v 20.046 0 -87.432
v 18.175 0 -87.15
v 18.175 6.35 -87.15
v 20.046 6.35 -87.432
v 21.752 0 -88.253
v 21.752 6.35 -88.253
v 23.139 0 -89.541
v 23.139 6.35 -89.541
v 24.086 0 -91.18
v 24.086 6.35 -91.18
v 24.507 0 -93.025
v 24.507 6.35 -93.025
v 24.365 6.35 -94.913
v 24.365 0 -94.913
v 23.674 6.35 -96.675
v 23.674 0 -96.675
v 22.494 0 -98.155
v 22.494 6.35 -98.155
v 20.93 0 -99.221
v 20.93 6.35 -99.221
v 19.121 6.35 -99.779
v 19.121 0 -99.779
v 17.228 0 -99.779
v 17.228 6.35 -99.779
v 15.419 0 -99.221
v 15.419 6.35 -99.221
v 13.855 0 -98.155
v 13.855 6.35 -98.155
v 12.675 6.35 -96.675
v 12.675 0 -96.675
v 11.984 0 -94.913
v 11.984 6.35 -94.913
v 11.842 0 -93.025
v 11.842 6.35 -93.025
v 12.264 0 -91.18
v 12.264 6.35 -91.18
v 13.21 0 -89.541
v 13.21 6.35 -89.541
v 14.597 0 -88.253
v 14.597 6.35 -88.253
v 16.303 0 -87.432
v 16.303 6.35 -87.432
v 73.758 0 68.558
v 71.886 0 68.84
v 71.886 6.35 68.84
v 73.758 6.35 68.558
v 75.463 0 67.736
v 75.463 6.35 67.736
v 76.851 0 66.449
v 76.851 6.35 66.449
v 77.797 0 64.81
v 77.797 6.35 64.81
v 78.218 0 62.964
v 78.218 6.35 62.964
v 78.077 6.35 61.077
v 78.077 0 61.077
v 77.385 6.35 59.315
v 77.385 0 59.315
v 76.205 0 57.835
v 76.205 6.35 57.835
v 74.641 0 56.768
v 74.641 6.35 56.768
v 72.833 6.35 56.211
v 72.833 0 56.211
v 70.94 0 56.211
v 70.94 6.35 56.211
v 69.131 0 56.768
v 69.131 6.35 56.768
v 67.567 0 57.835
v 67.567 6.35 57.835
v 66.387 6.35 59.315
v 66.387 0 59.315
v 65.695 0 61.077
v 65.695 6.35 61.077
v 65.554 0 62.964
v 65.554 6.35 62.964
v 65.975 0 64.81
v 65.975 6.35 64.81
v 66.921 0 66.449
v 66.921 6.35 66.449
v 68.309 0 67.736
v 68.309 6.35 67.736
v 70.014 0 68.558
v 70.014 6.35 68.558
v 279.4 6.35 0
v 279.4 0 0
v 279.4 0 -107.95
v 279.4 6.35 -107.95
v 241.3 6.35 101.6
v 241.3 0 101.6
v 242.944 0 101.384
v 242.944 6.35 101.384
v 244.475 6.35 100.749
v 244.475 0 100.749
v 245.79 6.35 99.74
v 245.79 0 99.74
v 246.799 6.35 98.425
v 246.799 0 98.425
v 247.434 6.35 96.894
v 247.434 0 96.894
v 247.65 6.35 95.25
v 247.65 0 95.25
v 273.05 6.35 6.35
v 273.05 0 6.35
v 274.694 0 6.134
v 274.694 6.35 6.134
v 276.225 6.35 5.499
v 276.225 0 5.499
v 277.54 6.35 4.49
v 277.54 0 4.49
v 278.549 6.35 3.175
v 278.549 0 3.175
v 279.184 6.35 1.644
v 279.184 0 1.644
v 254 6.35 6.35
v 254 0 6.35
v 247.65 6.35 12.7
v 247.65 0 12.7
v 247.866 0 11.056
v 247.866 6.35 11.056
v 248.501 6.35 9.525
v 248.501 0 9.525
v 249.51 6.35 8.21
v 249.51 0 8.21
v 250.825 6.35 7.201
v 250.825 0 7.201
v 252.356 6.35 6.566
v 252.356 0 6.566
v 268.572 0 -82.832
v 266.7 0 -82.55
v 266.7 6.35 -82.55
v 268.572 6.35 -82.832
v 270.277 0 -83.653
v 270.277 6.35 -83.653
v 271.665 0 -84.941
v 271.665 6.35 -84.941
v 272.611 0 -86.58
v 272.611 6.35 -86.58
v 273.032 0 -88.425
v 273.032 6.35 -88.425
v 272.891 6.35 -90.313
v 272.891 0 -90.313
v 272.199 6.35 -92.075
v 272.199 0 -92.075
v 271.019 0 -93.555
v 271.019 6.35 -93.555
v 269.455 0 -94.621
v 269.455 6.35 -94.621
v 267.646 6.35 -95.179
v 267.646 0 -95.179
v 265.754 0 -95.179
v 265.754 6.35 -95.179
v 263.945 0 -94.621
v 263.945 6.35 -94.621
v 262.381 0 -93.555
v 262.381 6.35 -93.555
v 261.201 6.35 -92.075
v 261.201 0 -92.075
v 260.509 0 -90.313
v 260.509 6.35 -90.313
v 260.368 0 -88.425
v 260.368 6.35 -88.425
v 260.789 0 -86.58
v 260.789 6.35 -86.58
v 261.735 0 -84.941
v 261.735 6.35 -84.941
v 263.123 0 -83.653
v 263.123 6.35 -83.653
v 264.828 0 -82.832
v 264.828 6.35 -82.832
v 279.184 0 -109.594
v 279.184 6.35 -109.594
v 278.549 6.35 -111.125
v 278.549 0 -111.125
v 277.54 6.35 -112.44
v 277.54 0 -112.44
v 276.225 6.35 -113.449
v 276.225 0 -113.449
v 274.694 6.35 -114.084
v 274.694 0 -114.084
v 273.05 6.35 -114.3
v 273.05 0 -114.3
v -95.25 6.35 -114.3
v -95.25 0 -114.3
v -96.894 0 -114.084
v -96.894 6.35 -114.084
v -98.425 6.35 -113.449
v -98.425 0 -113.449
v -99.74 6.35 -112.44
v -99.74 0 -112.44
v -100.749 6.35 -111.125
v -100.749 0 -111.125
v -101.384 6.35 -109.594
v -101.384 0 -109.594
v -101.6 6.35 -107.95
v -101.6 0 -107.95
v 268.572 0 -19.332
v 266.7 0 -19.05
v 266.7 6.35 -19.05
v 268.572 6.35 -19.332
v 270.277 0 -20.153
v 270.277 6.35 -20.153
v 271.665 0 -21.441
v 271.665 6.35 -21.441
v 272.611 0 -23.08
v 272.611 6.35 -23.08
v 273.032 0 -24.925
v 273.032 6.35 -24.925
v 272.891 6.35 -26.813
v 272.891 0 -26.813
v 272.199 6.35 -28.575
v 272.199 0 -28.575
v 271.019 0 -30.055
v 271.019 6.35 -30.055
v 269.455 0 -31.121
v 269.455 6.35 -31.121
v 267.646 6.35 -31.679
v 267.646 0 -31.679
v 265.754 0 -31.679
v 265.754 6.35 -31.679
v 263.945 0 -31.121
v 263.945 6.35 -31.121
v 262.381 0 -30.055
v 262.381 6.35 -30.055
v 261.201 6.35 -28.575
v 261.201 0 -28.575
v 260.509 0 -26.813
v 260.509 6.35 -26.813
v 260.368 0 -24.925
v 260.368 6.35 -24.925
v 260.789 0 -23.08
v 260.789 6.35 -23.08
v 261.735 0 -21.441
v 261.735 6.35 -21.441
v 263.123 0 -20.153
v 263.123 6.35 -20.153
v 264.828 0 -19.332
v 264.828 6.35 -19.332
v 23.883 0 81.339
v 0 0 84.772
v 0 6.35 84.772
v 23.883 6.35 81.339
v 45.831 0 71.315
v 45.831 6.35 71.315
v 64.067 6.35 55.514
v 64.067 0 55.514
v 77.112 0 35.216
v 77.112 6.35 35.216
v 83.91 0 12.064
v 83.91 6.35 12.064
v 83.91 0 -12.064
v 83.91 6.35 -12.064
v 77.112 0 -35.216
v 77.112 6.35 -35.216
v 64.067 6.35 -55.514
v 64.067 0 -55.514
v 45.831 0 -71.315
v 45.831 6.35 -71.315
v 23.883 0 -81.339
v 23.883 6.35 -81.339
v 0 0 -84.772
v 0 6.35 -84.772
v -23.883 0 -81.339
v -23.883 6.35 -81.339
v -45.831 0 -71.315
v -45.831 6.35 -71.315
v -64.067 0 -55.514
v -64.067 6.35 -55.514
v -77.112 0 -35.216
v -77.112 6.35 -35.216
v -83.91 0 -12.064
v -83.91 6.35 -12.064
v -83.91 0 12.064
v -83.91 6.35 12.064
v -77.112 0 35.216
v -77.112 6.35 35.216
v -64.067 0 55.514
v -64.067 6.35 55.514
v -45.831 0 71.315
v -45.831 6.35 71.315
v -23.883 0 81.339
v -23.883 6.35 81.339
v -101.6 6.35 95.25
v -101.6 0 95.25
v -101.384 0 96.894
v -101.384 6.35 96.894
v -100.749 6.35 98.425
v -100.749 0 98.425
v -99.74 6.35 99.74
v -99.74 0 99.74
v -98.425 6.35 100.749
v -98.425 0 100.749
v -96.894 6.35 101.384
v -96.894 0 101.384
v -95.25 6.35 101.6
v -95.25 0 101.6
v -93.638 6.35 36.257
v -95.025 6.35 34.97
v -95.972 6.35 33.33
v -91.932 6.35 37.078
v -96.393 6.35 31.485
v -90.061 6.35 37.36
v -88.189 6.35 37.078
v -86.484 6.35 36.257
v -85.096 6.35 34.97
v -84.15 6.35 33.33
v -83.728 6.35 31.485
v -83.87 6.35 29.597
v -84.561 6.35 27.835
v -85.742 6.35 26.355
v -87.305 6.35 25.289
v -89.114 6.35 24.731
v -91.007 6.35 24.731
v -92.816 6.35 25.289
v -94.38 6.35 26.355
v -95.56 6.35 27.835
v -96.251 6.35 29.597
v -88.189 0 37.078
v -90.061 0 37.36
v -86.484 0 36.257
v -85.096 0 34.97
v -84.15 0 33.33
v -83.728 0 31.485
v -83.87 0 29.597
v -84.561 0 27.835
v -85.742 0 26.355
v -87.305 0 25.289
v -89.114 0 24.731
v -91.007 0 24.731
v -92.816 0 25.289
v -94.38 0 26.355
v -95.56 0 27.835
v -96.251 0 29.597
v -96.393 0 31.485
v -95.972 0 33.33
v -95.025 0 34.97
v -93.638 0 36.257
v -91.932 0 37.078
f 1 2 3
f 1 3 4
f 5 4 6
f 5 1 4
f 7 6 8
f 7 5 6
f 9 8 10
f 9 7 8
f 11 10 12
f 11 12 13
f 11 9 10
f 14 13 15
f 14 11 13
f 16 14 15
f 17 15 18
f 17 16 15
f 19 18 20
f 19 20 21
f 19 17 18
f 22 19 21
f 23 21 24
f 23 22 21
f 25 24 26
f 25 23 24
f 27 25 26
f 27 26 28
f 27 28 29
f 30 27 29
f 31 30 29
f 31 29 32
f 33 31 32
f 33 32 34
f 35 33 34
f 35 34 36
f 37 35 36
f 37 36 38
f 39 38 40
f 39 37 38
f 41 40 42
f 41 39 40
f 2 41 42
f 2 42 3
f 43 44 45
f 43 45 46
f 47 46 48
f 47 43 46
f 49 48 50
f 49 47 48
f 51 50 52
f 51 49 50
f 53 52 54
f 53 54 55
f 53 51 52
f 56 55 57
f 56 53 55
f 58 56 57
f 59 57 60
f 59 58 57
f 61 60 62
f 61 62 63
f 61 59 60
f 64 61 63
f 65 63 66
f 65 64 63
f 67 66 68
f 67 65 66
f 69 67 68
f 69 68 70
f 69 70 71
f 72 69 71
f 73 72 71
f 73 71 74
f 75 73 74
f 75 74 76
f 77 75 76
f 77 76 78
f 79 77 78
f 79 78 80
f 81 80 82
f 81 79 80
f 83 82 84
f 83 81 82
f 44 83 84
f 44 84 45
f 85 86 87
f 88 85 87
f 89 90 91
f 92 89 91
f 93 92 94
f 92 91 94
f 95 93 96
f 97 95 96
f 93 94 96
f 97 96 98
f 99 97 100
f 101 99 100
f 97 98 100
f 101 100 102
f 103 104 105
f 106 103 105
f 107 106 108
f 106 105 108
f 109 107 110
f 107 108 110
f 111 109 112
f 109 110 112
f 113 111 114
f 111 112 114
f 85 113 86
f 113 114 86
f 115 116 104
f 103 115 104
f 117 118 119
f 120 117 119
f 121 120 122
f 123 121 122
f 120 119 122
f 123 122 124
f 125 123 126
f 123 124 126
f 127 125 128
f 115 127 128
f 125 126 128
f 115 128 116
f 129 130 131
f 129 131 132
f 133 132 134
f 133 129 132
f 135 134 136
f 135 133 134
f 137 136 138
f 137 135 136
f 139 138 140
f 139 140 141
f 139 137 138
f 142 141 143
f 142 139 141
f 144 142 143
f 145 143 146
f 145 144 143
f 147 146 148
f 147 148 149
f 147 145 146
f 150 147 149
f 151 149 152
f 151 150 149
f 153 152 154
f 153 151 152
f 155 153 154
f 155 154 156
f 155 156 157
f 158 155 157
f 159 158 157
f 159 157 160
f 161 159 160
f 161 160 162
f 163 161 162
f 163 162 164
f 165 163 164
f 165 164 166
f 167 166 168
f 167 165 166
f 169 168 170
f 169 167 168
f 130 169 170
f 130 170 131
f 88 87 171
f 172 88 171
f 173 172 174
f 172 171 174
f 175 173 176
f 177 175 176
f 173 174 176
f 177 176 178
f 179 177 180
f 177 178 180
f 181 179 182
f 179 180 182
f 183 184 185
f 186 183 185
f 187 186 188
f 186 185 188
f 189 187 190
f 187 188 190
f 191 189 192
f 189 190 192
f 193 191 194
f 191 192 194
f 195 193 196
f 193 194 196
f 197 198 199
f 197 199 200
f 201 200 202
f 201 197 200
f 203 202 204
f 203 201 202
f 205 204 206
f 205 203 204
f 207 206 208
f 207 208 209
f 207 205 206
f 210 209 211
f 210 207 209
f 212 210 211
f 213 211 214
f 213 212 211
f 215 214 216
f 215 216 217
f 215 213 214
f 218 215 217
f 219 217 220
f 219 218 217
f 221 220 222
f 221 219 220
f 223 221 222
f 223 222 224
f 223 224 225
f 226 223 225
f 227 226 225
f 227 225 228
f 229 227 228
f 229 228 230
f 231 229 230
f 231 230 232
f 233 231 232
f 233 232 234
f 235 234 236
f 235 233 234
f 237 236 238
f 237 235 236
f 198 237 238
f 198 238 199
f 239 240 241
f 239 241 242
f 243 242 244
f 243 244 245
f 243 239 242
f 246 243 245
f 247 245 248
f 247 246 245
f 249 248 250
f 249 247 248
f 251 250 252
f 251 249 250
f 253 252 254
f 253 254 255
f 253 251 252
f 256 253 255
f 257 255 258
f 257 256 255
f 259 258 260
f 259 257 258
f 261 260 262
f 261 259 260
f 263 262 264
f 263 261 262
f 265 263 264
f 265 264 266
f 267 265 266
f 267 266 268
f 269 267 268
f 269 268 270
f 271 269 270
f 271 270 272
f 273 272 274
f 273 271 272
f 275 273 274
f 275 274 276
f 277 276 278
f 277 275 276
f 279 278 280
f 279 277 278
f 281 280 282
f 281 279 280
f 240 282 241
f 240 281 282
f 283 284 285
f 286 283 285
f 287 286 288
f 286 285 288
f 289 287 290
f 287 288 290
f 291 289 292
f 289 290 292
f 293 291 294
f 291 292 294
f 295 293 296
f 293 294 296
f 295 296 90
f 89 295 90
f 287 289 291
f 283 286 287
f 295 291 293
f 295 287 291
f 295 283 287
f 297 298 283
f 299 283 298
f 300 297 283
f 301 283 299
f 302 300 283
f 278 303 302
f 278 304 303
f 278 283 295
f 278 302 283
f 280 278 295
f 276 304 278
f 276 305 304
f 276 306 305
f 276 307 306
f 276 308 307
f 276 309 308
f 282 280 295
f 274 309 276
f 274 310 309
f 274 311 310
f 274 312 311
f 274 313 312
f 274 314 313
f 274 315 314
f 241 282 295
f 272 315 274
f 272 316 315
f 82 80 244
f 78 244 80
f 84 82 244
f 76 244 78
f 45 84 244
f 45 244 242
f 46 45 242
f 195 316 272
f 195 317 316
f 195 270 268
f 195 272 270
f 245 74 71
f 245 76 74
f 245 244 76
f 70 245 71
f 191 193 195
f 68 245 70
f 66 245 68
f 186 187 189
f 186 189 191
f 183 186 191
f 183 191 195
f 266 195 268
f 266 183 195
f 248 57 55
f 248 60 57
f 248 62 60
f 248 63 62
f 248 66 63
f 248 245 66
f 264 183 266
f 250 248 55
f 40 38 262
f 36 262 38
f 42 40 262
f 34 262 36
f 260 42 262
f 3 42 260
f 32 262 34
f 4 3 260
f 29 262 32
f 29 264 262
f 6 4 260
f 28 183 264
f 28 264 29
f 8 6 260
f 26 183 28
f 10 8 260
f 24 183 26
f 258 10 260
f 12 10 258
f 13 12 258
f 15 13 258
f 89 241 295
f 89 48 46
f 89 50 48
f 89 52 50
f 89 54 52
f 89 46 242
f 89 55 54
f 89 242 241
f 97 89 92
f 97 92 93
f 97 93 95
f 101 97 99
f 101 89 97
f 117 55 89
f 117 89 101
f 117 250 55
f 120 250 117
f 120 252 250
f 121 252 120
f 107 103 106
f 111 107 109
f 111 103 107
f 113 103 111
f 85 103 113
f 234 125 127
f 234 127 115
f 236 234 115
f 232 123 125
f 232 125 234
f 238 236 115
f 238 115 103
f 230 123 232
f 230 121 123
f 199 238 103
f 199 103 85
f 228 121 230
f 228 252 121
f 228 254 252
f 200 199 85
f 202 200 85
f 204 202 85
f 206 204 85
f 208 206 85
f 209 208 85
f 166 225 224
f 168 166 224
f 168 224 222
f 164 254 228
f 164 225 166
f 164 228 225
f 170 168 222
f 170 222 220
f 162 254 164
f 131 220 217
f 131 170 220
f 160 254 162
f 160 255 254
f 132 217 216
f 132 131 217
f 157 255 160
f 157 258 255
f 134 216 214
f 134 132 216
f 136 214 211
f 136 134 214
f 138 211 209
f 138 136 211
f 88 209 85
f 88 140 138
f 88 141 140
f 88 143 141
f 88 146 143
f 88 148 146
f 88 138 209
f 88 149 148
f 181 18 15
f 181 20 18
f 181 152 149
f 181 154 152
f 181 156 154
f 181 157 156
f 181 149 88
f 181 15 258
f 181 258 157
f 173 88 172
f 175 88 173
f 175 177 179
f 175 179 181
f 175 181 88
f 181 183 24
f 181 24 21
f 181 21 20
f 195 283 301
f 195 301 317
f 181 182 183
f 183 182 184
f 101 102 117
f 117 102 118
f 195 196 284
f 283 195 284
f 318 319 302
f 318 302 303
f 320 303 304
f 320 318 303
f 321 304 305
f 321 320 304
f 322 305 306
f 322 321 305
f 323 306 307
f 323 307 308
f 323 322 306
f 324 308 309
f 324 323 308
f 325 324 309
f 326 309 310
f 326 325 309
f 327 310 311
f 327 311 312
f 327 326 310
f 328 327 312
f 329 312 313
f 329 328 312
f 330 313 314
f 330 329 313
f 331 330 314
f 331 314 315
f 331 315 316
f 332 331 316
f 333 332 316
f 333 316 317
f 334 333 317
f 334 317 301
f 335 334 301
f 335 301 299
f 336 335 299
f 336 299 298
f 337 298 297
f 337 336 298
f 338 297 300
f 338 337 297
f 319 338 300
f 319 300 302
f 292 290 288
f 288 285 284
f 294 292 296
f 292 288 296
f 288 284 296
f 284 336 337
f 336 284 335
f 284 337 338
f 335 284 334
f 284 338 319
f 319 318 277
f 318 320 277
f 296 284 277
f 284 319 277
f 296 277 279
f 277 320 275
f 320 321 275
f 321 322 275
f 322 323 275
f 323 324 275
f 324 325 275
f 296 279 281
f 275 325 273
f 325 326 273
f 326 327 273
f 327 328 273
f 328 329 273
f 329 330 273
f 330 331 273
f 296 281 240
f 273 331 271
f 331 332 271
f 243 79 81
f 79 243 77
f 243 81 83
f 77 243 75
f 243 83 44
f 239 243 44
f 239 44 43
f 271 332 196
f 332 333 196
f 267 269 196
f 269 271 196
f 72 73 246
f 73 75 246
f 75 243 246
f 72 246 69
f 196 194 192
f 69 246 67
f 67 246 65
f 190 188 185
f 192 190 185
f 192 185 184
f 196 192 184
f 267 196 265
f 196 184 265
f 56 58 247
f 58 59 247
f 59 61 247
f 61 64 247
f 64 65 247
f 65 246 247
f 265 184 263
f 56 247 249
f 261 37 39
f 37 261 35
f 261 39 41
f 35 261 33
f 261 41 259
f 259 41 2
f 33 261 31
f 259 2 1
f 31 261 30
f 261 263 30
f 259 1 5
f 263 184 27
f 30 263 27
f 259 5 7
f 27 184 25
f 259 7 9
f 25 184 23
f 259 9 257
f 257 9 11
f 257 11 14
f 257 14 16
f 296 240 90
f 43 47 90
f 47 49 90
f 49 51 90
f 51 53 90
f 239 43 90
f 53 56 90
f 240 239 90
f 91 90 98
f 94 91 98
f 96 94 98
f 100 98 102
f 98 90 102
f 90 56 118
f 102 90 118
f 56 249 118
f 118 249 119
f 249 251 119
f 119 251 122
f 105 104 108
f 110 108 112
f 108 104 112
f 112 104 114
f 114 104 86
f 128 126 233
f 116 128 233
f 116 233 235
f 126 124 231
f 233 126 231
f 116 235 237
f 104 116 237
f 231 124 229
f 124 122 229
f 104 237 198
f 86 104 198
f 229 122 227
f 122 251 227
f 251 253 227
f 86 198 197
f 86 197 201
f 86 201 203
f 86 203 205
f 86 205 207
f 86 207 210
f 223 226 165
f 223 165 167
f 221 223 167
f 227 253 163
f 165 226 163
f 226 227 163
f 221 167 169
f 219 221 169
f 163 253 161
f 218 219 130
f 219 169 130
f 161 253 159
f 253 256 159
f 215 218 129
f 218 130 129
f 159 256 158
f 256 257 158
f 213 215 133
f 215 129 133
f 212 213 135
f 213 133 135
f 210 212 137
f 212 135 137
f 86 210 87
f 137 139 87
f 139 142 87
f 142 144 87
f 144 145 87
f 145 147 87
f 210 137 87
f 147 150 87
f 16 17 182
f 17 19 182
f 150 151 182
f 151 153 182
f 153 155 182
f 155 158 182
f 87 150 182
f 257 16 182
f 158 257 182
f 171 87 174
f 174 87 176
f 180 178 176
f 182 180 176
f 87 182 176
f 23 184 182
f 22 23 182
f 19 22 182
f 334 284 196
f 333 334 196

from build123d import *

# Parameters (mm, degrees)
SKETCH1_R           = 84.7725
SKETCH1_R_2         = 6.35
BOSS_EXTRUDE1_DEPTH = 6.35


with BuildPart() as part:
    # Sketch1 → Boss-Extrude1 (new body)
    with BuildSketch(Plane(origin=(0, 0, 0), x_dir=(1, 0, 0), z_dir=(0, 1, 0))):
        with BuildLine():
            Line((273.05, 114.3), (-95.25, 114.3))
            ThreePointArc((-95.25, 114.3), (-99.740128061, 112.440128061), (-101.6, 107.95))
            Line((-101.6, 107.95), (-101.6, -95.25))
            ThreePointArc((-101.6, -95.25), (-99.740128061, -99.740128061), (-95.25, -101.6))
            Line((-95.25, -101.6), (241.3, -101.6))
            ThreePointArc((241.3, -101.6), (245.790128061, -99.740128061), (247.65, -95.25))
            Line((247.65, -95.25), (247.65, -12.7))
            ThreePointArc((247.65, -12.7), (249.509871939, -8.209871939), (254, -6.35))
            Line((254, -6.35), (273.05, -6.35))
            ThreePointArc((273.05, -6.35), (277.540128061, -4.490128061), (279.4, 0))
            Line((279.4, 0), (279.4, 107.95))
            ThreePointArc((279.4, 107.95), (277.540128061, 112.440128061), (273.05, 114.3))
        make_face()
        with Locations(Location((0, 0, 0), (0, 0, 270))):
            Circle(SKETCH1_R, mode=Mode.SUBTRACT)
        with Locations(Location((-90.060644326, -31.010366712, 0), (0, 0, 270))):
            Circle(SKETCH1_R_2, mode=Mode.SUBTRACT)
        with Locations(Location((18.17455681, 93.499989223, 0), (0, 0, 270))):
            Circle(SKETCH1_R_2, mode=Mode.SUBTRACT)
        with Locations(Location((71.886087516, -62.489622511, 0), (0, 0, 270))):
            Circle(SKETCH1_R_2, mode=Mode.SUBTRACT)
        with Locations(Location((266.7, 88.9, 0), (0, 0, 270))):
            Circle(SKETCH1_R_2, mode=Mode.SUBTRACT)
        with Locations(Location((266.7, 25.4, 0), (0, 0, 270))):
            Circle(SKETCH1_R_2, mode=Mode.SUBTRACT)
    extrude(amount=BOSS_EXTRUDE1_DEPTH)


solid = part.part
